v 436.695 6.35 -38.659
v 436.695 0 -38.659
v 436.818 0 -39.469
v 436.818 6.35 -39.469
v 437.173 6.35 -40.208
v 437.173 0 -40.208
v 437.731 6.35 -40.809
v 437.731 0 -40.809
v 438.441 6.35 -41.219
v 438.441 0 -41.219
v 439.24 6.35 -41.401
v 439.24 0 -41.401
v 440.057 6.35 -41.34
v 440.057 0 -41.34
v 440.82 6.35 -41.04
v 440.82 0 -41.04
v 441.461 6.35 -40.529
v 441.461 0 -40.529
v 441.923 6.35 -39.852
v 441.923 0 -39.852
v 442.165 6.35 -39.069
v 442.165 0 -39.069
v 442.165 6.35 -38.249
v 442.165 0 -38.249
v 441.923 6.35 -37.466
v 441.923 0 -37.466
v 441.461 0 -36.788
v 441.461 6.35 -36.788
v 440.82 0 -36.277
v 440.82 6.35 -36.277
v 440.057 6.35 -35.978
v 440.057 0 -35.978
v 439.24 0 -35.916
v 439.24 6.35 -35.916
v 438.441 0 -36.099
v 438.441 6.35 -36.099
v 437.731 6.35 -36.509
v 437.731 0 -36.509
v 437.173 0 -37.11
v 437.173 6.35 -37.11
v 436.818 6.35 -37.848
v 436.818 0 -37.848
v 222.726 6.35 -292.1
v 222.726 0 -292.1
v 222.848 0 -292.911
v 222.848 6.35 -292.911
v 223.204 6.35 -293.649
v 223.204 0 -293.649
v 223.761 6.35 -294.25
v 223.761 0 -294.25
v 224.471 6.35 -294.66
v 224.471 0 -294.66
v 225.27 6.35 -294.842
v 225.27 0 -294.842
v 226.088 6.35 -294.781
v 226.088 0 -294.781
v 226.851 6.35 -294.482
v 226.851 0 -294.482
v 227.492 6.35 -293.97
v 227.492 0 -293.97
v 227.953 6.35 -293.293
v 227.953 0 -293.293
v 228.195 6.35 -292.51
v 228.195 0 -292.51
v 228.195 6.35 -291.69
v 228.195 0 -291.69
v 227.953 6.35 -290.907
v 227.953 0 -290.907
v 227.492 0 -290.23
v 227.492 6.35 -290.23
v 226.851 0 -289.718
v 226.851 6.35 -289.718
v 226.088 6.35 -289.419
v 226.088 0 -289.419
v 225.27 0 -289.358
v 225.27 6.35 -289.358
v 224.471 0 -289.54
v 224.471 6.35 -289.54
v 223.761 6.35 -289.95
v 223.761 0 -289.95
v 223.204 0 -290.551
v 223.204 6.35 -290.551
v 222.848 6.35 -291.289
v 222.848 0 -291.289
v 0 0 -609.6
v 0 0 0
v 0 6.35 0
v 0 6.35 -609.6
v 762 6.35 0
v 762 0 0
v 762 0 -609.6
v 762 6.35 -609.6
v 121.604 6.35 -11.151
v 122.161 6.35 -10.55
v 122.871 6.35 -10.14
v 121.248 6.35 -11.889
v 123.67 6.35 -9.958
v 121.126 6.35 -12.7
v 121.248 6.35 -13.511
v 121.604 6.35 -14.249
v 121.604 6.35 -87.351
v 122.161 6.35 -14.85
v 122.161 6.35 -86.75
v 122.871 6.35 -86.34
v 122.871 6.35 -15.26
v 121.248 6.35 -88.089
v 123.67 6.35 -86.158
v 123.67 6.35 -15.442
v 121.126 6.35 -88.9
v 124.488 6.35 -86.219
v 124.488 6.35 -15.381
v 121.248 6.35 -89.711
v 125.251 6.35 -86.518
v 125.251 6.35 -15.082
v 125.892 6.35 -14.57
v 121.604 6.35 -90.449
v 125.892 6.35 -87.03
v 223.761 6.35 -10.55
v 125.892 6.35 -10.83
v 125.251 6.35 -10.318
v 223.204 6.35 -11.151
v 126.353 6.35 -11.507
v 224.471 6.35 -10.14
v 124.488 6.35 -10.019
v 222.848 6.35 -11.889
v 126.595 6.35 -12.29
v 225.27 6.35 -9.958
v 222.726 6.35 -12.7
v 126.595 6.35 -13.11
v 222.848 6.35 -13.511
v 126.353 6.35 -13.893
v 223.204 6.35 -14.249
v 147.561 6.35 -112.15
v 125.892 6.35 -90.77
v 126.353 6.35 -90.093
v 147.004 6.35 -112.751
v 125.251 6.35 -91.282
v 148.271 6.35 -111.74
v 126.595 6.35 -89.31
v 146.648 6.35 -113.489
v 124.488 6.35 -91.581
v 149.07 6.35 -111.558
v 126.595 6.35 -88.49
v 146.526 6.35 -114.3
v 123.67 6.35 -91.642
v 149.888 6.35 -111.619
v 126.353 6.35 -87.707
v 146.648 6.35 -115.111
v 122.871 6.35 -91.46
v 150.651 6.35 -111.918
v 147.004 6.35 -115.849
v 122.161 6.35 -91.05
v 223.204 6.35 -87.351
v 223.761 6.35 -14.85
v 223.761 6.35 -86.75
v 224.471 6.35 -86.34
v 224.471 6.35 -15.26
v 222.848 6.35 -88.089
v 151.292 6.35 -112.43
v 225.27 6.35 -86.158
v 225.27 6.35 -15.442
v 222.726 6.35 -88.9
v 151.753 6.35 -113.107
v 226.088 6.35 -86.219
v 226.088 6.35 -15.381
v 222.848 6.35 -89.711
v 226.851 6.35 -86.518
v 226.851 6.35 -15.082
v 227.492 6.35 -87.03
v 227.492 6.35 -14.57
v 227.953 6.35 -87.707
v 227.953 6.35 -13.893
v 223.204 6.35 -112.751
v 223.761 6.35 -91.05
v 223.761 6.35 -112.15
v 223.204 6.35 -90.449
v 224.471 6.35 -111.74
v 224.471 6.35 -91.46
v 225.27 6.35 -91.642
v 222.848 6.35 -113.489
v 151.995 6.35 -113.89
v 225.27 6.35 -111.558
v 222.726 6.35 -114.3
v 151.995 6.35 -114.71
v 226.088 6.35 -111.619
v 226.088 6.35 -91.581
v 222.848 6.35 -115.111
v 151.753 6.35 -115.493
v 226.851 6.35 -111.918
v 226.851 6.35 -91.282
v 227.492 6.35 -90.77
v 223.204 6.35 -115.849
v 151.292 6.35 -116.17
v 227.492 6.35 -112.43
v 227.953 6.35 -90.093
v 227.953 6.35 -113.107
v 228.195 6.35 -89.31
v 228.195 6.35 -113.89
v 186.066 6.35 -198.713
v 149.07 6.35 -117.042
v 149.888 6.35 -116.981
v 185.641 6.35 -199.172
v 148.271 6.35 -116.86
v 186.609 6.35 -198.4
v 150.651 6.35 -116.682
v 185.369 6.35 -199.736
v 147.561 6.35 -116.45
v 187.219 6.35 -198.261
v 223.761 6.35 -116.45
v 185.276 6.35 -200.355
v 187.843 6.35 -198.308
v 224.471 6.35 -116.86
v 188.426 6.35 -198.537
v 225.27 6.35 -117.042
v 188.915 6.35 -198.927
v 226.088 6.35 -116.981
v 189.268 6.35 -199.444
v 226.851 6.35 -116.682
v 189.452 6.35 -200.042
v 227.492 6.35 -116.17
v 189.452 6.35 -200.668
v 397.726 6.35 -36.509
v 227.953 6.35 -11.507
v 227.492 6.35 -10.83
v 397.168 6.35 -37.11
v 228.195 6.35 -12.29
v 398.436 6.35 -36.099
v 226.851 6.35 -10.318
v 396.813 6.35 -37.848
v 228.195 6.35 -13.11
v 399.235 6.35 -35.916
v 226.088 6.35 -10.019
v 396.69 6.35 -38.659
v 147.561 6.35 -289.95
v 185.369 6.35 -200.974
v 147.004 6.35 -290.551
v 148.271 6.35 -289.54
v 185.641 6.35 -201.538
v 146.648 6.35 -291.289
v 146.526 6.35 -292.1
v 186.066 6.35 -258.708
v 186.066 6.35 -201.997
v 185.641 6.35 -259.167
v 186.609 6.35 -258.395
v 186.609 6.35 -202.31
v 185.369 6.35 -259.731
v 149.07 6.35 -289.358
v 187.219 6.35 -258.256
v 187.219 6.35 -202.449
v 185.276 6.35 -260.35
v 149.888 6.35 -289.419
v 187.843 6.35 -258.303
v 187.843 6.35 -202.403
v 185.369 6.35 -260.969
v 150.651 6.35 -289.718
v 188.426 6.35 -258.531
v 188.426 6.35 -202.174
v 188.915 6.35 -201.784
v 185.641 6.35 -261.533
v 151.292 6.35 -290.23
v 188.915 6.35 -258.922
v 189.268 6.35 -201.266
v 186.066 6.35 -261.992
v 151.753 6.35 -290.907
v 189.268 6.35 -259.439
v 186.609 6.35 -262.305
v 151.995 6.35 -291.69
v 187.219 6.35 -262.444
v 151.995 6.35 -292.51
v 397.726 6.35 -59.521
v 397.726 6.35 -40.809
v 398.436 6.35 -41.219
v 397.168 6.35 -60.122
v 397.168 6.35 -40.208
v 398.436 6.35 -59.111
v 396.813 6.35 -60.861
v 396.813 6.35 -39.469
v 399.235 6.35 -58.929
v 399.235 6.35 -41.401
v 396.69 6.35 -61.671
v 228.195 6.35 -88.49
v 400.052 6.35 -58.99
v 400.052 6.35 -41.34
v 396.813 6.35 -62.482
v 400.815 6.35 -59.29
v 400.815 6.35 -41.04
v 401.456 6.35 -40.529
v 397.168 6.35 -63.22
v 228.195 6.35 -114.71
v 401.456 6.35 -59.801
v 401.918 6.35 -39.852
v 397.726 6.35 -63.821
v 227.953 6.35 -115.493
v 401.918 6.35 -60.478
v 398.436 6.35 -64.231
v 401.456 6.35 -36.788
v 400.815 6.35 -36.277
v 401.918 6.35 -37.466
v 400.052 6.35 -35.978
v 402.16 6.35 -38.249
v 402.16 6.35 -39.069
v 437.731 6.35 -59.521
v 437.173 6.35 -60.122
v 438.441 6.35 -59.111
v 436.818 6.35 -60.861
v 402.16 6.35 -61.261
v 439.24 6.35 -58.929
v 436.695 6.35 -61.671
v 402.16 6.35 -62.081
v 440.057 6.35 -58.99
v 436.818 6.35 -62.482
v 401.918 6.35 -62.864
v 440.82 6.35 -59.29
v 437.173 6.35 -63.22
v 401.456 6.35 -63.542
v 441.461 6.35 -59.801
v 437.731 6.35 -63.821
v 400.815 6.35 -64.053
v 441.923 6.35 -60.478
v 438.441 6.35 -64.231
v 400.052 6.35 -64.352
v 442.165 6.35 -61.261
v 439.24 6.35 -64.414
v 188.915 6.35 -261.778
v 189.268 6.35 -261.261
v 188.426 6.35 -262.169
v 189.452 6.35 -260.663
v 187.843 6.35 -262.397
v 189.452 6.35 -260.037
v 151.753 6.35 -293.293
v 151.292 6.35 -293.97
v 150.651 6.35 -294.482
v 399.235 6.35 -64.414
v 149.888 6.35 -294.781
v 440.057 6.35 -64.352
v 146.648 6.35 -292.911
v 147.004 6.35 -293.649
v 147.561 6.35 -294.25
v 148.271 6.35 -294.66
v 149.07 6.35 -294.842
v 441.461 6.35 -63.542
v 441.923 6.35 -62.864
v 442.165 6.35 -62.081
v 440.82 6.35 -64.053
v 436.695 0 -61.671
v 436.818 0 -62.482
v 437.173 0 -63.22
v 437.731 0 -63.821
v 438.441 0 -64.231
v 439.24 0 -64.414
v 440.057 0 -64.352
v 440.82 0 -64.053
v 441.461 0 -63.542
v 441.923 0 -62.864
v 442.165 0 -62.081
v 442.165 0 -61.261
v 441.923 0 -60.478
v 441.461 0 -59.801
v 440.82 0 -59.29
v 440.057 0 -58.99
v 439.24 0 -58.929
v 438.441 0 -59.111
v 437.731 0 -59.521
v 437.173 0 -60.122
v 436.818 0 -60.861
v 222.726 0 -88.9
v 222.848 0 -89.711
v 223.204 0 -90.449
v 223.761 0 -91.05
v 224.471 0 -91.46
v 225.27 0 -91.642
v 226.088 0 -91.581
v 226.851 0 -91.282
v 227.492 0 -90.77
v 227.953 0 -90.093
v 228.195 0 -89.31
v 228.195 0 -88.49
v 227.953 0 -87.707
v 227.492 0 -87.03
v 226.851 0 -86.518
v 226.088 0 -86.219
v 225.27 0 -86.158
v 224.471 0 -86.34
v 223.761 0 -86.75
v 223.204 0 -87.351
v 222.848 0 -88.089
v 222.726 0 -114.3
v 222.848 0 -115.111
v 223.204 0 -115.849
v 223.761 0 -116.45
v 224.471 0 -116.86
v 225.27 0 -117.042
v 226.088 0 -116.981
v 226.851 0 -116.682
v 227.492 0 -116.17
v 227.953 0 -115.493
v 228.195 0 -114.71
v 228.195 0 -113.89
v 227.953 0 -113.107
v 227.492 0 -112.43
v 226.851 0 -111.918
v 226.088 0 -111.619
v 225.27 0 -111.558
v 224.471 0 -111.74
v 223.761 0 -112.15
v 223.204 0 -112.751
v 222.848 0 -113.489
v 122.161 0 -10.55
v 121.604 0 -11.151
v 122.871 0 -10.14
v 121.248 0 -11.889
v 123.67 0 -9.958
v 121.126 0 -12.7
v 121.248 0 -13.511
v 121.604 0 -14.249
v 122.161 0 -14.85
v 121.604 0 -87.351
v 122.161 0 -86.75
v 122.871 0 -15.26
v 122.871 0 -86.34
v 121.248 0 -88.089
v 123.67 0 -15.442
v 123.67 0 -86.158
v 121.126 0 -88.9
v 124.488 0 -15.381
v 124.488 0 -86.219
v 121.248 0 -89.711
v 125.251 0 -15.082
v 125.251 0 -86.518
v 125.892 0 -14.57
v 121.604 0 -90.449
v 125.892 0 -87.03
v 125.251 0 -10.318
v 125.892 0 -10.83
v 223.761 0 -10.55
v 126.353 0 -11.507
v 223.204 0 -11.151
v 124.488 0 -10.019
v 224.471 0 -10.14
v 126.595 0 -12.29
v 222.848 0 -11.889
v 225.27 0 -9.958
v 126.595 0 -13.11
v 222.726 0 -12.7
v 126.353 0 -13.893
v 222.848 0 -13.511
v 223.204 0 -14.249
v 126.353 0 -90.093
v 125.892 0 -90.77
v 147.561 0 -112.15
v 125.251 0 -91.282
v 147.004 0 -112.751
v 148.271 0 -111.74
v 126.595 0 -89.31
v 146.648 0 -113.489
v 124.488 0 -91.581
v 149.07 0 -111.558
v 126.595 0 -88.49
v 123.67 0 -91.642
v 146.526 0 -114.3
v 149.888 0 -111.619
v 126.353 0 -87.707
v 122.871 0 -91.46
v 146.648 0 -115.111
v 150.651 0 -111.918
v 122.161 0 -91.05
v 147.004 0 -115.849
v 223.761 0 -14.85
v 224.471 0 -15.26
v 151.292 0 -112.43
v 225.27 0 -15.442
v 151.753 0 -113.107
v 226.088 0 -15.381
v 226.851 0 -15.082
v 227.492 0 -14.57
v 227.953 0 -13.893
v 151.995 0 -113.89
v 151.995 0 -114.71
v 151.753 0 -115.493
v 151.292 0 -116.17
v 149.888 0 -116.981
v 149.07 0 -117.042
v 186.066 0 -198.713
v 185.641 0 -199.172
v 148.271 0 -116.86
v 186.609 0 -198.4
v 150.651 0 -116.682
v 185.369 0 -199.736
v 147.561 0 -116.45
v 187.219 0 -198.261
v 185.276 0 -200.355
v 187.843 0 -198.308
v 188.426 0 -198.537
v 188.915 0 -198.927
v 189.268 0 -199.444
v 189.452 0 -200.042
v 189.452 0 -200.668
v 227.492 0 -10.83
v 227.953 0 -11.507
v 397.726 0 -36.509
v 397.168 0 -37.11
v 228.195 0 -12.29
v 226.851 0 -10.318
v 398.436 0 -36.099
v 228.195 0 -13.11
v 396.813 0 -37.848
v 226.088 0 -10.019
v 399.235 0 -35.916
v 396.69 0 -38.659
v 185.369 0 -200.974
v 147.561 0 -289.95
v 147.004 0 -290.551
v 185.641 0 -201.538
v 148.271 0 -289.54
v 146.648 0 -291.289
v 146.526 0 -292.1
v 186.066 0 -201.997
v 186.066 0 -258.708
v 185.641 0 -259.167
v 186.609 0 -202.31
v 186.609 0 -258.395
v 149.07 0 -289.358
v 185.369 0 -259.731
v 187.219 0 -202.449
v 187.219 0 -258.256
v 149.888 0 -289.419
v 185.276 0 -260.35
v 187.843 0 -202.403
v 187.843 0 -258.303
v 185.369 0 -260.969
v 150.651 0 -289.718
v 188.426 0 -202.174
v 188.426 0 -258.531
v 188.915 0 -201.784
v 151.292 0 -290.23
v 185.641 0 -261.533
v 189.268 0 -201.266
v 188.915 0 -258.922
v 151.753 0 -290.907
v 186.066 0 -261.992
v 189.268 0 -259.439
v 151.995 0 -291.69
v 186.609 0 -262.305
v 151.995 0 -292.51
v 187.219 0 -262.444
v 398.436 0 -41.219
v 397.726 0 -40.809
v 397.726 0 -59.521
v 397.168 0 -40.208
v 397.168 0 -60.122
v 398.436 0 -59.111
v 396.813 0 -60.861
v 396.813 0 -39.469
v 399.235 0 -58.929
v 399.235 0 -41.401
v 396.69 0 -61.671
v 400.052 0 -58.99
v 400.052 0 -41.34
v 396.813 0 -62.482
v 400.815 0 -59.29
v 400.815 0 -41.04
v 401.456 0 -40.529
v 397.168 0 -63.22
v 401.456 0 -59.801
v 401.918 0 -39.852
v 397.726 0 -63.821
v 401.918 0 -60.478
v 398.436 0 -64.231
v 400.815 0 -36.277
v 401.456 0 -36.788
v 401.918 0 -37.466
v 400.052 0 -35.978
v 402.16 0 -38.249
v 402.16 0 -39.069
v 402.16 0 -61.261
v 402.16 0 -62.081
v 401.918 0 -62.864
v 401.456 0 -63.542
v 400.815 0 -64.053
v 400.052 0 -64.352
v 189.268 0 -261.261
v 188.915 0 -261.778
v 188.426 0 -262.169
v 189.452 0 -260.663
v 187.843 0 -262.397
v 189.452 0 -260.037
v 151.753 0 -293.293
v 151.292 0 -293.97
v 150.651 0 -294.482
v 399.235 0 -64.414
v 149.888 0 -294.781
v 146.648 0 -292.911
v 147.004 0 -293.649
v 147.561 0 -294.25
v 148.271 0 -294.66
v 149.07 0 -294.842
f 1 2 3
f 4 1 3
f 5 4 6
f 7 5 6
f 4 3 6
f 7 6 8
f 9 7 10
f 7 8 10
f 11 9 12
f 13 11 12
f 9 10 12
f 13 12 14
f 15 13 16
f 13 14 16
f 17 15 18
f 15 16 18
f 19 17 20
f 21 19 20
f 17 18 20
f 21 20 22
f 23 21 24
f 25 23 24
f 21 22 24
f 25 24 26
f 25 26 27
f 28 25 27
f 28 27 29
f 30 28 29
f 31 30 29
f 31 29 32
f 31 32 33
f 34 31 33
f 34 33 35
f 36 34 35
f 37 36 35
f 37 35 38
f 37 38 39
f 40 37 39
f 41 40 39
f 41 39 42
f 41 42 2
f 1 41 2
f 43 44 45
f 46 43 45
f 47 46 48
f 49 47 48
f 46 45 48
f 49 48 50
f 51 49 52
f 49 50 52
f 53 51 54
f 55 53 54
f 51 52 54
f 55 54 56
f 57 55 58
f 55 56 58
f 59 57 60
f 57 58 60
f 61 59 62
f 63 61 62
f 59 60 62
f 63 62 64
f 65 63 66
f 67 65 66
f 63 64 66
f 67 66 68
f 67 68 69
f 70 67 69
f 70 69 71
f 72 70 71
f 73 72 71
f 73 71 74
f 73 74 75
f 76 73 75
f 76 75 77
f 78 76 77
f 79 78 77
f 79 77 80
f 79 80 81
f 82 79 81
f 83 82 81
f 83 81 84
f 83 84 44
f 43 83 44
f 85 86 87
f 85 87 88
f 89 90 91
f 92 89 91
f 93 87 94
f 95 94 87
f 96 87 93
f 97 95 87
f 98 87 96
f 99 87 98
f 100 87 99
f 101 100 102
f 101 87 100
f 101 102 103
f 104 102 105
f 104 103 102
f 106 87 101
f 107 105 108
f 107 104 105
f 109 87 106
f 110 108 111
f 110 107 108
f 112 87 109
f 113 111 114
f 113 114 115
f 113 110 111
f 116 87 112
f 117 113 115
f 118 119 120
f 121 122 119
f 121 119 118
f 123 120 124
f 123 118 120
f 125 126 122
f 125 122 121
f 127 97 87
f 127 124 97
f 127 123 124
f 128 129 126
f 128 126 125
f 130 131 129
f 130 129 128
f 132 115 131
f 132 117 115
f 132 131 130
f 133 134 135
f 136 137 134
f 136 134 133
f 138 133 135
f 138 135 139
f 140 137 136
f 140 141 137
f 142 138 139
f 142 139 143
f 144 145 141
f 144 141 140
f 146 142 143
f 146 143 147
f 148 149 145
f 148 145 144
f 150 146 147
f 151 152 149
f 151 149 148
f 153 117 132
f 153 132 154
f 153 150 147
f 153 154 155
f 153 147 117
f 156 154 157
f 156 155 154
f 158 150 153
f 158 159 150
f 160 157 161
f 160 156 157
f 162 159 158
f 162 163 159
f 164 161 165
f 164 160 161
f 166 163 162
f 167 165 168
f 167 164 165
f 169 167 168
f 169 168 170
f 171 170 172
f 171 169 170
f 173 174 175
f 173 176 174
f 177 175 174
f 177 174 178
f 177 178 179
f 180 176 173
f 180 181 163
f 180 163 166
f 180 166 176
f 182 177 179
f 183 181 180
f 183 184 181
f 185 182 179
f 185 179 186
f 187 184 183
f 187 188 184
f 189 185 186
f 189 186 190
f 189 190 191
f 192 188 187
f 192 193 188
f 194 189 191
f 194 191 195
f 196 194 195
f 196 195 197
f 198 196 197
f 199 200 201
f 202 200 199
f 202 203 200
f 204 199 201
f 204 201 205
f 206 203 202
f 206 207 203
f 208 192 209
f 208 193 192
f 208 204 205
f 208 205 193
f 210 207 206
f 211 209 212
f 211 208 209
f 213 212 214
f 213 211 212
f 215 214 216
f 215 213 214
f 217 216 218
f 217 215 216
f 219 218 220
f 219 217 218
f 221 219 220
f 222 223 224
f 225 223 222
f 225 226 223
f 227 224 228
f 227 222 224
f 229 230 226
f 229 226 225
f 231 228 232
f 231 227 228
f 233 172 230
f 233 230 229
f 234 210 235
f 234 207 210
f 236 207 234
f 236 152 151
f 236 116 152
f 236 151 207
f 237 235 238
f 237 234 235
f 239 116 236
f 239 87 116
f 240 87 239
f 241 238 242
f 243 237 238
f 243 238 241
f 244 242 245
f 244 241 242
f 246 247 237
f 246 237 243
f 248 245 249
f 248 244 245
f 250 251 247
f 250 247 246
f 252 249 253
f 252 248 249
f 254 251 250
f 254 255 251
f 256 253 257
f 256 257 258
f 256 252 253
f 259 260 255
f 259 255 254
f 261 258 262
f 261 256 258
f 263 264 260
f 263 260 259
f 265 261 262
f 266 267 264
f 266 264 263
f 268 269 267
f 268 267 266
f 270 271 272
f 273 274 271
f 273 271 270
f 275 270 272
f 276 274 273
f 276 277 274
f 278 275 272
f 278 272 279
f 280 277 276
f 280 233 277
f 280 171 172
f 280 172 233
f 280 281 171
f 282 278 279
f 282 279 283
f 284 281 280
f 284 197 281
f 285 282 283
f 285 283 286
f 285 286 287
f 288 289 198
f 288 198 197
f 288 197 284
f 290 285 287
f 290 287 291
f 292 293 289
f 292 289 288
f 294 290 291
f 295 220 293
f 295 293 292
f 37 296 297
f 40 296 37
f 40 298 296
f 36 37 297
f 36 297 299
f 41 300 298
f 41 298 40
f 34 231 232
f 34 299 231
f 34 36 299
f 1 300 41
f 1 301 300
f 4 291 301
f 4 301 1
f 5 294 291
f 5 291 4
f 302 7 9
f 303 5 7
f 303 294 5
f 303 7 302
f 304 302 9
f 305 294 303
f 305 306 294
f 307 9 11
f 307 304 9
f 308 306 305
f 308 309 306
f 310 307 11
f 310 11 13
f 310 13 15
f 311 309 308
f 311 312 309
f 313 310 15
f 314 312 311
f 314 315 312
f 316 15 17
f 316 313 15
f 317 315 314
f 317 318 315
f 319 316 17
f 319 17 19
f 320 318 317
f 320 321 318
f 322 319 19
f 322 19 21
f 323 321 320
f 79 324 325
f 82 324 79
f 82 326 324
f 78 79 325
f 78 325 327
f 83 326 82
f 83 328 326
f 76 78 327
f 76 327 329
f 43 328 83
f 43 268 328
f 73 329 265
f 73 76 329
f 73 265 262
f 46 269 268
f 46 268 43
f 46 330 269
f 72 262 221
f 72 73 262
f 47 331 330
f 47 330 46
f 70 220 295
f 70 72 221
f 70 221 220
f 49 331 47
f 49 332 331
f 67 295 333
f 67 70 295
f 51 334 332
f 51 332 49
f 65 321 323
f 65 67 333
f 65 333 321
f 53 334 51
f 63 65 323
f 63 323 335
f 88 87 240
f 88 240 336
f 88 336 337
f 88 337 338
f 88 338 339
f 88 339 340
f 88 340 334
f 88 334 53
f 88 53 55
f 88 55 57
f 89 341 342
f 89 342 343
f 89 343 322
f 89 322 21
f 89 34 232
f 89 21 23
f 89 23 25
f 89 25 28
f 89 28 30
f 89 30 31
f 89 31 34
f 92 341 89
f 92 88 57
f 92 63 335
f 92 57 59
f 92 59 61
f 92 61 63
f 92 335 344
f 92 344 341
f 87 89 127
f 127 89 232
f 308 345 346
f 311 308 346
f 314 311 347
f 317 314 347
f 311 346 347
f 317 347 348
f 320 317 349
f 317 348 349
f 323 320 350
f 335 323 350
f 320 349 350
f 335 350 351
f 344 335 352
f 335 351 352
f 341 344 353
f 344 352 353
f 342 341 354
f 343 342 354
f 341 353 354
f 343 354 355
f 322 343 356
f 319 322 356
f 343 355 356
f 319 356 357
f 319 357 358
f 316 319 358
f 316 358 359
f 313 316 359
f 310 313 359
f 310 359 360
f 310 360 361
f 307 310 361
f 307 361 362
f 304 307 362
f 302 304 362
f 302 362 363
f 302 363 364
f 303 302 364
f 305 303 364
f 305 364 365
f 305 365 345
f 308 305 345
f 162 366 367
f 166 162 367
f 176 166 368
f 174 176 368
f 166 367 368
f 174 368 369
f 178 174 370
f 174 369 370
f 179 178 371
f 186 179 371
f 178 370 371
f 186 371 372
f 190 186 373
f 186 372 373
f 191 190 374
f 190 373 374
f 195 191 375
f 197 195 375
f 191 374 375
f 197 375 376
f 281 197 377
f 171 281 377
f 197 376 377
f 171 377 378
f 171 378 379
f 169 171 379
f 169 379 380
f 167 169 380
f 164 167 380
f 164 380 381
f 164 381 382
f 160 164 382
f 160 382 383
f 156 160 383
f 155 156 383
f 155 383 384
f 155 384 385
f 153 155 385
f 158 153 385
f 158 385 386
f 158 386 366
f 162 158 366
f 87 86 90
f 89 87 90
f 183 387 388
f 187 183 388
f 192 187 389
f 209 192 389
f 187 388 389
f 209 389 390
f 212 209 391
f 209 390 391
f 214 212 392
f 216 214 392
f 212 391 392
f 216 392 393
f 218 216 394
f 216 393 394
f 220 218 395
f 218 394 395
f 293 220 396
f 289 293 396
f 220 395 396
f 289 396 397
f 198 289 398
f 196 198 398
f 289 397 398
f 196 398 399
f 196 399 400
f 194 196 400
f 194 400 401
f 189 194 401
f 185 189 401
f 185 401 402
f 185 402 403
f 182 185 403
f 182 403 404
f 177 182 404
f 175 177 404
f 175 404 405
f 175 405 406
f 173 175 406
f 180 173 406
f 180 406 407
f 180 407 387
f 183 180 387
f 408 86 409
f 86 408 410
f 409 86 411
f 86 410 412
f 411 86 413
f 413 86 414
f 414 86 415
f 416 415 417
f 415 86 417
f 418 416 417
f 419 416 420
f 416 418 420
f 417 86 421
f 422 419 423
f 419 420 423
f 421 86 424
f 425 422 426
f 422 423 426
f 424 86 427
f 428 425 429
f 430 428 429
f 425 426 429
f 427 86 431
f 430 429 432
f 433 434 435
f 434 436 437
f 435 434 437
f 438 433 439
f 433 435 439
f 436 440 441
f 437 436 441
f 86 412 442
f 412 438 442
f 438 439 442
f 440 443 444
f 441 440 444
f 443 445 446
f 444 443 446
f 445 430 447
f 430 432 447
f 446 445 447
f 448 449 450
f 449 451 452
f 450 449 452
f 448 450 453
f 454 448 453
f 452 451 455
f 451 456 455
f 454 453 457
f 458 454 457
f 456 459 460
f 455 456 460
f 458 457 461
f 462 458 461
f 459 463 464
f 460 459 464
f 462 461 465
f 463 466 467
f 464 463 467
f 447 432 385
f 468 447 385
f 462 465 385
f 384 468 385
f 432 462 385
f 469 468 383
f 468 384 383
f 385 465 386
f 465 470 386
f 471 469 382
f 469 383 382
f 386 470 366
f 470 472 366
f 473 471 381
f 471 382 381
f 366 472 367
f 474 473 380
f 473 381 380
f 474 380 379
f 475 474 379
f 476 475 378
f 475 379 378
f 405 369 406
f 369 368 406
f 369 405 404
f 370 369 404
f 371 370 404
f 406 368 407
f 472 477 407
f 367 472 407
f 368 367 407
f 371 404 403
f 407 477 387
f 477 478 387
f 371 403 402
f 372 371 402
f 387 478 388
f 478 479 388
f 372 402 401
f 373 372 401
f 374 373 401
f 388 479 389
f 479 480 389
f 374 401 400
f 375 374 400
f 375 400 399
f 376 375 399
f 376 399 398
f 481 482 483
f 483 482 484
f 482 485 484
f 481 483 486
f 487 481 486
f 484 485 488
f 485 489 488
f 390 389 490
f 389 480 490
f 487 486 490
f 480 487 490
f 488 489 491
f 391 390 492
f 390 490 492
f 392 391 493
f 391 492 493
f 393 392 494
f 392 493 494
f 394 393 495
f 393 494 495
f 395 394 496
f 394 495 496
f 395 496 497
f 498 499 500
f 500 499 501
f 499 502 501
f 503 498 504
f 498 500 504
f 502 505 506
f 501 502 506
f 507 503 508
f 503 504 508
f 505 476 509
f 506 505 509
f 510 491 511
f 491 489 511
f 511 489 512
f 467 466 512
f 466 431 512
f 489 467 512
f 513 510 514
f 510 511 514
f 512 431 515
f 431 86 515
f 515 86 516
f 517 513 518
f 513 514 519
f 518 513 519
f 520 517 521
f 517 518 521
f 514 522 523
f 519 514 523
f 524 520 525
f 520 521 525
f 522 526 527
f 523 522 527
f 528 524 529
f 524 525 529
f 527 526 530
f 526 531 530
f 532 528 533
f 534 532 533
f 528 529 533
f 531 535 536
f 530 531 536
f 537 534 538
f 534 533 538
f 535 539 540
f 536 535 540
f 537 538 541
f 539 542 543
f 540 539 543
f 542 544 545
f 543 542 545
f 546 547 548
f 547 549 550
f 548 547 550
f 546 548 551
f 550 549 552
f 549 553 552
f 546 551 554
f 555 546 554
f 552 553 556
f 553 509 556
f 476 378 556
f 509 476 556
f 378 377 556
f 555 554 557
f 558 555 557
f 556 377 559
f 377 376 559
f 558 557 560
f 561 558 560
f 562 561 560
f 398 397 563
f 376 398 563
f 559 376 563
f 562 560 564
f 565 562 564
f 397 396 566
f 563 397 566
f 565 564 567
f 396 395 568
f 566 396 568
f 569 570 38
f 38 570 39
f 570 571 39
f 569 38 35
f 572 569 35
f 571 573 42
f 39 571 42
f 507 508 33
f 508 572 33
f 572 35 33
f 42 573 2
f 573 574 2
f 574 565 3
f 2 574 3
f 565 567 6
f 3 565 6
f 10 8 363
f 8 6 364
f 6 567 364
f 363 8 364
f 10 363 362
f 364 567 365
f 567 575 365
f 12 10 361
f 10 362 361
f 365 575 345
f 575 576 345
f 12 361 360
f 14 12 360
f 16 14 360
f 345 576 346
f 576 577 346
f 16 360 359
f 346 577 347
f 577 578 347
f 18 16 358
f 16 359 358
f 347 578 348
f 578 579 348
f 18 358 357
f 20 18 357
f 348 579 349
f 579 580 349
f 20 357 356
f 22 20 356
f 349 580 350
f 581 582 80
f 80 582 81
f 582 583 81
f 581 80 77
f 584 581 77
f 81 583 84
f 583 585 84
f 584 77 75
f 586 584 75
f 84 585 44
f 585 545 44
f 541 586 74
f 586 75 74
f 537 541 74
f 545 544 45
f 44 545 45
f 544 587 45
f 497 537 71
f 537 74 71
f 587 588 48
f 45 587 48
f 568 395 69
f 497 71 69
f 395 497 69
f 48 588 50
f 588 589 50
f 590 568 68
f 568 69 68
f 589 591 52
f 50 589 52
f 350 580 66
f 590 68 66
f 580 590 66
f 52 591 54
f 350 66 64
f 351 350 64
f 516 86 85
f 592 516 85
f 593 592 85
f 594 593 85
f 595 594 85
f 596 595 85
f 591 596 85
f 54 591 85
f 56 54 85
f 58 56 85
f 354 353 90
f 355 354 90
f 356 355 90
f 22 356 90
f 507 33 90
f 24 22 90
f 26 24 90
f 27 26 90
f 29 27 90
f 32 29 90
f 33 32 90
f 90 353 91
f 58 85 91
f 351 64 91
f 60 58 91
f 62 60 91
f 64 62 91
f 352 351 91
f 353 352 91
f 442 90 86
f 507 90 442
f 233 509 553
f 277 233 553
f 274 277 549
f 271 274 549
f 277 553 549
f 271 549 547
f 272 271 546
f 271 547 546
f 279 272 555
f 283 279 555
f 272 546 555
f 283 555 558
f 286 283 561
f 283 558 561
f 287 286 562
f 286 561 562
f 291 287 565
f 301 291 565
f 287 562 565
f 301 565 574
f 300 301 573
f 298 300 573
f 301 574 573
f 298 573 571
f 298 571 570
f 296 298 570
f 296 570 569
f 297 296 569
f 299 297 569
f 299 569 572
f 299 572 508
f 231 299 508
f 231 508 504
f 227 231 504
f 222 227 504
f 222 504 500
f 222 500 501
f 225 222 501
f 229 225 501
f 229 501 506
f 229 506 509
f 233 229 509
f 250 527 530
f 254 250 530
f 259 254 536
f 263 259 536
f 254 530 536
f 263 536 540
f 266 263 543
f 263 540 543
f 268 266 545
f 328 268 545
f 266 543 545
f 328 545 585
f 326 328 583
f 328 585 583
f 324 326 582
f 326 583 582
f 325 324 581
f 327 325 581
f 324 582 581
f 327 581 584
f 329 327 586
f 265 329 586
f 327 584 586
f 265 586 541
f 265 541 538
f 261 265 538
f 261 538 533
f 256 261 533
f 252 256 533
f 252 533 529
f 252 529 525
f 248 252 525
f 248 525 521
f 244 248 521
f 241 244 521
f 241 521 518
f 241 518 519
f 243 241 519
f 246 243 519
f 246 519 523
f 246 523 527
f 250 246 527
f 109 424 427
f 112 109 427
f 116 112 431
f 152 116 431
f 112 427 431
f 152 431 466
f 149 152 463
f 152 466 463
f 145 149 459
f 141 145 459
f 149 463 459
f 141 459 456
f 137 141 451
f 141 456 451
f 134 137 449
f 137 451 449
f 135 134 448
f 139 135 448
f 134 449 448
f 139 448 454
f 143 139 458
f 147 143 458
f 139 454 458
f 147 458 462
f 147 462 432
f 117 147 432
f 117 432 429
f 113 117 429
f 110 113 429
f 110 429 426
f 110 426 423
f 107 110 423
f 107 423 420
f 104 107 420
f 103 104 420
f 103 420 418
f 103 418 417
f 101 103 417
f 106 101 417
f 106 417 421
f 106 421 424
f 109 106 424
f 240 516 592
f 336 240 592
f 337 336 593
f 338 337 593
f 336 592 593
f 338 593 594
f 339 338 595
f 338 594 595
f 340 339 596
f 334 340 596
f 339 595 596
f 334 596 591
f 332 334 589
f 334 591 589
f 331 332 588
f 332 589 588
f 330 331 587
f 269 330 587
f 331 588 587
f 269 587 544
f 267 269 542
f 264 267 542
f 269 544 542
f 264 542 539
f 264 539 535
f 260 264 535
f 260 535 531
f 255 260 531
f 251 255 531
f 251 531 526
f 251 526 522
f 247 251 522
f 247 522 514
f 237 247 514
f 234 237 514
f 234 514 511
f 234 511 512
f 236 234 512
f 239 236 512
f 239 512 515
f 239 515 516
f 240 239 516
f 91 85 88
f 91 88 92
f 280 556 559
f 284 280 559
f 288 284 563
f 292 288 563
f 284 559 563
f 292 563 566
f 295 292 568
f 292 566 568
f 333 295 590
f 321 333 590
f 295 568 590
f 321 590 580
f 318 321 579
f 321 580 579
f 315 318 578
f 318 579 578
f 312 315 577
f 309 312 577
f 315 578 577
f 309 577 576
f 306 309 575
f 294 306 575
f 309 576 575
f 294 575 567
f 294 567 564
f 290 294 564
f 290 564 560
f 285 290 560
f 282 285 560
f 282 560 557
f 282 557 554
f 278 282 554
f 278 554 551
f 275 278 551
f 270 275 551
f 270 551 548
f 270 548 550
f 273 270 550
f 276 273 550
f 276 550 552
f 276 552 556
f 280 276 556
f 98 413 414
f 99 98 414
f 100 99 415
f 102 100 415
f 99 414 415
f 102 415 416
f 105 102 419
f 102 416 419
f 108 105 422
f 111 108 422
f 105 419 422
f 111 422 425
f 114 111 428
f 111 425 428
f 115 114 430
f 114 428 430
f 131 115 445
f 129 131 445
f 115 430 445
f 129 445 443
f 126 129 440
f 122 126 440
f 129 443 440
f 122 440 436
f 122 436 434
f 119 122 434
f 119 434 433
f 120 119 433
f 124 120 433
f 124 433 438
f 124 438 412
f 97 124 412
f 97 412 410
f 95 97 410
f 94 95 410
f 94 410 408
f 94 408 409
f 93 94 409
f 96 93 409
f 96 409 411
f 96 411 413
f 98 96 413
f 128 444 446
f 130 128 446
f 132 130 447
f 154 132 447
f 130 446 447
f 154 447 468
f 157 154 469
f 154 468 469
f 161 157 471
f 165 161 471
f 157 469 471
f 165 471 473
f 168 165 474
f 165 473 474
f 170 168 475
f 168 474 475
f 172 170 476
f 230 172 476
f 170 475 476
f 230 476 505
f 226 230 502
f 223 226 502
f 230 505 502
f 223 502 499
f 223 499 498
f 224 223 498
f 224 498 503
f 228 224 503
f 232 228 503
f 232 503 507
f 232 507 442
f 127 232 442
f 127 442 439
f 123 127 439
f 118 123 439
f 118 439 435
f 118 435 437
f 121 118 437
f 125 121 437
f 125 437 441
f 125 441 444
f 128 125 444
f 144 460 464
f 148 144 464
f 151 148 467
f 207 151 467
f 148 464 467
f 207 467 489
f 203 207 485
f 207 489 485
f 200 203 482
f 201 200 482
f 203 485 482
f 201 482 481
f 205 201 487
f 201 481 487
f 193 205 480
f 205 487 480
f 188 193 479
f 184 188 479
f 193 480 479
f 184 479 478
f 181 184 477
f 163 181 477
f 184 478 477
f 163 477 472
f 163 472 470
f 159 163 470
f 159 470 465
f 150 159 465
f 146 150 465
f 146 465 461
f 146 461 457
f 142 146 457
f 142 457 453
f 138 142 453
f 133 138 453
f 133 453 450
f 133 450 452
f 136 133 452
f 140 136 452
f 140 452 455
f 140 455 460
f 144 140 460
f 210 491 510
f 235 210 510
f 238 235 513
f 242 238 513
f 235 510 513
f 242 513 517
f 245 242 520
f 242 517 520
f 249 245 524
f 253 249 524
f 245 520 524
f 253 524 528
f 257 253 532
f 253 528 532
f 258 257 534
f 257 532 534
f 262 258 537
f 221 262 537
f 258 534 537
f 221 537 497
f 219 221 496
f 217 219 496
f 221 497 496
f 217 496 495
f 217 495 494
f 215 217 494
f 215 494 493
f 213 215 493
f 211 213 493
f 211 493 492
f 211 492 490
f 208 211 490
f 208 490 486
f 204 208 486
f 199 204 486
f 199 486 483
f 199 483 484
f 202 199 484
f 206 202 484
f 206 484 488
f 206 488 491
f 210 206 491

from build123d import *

# Parameters (mm, degrees)
SKETCH1_W             = 762
SKETCH1_H             = 609.6
BOSS_EXTRUDE1_DEPTH   = 6.35
M5_CLEARANCE_HOLE1_D  = 5.5
M5_CLEARANCE_HOLE2_D  = 5.5
M5X0_8_TAPPED_HOLE2_D = 4.2


with BuildPart() as part:
    # Sketch1 → Boss-Extrude1 (new body)
    with BuildSketch(Plane(origin=(0, 0, 0), x_dir=(1, 0, 0), z_dir=(0, 1, 0))):
        with Locations((381, 304.8)):
            Rectangle(SKETCH1_W, SKETCH1_H)
    extrude(amount=BOSS_EXTRUDE1_DEPTH)

    # M5 Clearance Hole1 (through all)
    with Locations(Plane(origin=(0, 6.35, 0), x_dir=(1, 0, 0), z_dir=(0, 1, 0))):
        with Locations((439.4454, 61.6712), (399.4404, 61.6712), (399.4404, 38.6588), (439.4454, 38.6588)):
            Hole(M5_CLEARANCE_HOLE1_D / 2)

    # M5 Clearance Hole2 (through all)
    with Locations(Plane(origin=(0, 6.35, 0), x_dir=(1, 0, 0), z_dir=(0, 1, 0))):
        with Locations((123.8758, 12.7), (225.4758, 12.7), (225.4758, 88.9), (123.8758, 88.9), (225.4758, 114.3), (225.4758, 292.1), (149.2758, 292.1), (149.2758, 114.3)):
            Hole(M5_CLEARANCE_HOLE2_D / 2)

    # M5x0.8 Tapped Hole2 (through all)
    with Locations(Plane(origin=(0, 6.35, 0), x_dir=(1, 0, 0), z_dir=(0, 1, 0))):
        with Locations((187.3758, 260.35), (187.3758, 200.3552)):
            Hole(M5X0_8_TAPPED_HOLE2_D / 2)


solid = part.part
